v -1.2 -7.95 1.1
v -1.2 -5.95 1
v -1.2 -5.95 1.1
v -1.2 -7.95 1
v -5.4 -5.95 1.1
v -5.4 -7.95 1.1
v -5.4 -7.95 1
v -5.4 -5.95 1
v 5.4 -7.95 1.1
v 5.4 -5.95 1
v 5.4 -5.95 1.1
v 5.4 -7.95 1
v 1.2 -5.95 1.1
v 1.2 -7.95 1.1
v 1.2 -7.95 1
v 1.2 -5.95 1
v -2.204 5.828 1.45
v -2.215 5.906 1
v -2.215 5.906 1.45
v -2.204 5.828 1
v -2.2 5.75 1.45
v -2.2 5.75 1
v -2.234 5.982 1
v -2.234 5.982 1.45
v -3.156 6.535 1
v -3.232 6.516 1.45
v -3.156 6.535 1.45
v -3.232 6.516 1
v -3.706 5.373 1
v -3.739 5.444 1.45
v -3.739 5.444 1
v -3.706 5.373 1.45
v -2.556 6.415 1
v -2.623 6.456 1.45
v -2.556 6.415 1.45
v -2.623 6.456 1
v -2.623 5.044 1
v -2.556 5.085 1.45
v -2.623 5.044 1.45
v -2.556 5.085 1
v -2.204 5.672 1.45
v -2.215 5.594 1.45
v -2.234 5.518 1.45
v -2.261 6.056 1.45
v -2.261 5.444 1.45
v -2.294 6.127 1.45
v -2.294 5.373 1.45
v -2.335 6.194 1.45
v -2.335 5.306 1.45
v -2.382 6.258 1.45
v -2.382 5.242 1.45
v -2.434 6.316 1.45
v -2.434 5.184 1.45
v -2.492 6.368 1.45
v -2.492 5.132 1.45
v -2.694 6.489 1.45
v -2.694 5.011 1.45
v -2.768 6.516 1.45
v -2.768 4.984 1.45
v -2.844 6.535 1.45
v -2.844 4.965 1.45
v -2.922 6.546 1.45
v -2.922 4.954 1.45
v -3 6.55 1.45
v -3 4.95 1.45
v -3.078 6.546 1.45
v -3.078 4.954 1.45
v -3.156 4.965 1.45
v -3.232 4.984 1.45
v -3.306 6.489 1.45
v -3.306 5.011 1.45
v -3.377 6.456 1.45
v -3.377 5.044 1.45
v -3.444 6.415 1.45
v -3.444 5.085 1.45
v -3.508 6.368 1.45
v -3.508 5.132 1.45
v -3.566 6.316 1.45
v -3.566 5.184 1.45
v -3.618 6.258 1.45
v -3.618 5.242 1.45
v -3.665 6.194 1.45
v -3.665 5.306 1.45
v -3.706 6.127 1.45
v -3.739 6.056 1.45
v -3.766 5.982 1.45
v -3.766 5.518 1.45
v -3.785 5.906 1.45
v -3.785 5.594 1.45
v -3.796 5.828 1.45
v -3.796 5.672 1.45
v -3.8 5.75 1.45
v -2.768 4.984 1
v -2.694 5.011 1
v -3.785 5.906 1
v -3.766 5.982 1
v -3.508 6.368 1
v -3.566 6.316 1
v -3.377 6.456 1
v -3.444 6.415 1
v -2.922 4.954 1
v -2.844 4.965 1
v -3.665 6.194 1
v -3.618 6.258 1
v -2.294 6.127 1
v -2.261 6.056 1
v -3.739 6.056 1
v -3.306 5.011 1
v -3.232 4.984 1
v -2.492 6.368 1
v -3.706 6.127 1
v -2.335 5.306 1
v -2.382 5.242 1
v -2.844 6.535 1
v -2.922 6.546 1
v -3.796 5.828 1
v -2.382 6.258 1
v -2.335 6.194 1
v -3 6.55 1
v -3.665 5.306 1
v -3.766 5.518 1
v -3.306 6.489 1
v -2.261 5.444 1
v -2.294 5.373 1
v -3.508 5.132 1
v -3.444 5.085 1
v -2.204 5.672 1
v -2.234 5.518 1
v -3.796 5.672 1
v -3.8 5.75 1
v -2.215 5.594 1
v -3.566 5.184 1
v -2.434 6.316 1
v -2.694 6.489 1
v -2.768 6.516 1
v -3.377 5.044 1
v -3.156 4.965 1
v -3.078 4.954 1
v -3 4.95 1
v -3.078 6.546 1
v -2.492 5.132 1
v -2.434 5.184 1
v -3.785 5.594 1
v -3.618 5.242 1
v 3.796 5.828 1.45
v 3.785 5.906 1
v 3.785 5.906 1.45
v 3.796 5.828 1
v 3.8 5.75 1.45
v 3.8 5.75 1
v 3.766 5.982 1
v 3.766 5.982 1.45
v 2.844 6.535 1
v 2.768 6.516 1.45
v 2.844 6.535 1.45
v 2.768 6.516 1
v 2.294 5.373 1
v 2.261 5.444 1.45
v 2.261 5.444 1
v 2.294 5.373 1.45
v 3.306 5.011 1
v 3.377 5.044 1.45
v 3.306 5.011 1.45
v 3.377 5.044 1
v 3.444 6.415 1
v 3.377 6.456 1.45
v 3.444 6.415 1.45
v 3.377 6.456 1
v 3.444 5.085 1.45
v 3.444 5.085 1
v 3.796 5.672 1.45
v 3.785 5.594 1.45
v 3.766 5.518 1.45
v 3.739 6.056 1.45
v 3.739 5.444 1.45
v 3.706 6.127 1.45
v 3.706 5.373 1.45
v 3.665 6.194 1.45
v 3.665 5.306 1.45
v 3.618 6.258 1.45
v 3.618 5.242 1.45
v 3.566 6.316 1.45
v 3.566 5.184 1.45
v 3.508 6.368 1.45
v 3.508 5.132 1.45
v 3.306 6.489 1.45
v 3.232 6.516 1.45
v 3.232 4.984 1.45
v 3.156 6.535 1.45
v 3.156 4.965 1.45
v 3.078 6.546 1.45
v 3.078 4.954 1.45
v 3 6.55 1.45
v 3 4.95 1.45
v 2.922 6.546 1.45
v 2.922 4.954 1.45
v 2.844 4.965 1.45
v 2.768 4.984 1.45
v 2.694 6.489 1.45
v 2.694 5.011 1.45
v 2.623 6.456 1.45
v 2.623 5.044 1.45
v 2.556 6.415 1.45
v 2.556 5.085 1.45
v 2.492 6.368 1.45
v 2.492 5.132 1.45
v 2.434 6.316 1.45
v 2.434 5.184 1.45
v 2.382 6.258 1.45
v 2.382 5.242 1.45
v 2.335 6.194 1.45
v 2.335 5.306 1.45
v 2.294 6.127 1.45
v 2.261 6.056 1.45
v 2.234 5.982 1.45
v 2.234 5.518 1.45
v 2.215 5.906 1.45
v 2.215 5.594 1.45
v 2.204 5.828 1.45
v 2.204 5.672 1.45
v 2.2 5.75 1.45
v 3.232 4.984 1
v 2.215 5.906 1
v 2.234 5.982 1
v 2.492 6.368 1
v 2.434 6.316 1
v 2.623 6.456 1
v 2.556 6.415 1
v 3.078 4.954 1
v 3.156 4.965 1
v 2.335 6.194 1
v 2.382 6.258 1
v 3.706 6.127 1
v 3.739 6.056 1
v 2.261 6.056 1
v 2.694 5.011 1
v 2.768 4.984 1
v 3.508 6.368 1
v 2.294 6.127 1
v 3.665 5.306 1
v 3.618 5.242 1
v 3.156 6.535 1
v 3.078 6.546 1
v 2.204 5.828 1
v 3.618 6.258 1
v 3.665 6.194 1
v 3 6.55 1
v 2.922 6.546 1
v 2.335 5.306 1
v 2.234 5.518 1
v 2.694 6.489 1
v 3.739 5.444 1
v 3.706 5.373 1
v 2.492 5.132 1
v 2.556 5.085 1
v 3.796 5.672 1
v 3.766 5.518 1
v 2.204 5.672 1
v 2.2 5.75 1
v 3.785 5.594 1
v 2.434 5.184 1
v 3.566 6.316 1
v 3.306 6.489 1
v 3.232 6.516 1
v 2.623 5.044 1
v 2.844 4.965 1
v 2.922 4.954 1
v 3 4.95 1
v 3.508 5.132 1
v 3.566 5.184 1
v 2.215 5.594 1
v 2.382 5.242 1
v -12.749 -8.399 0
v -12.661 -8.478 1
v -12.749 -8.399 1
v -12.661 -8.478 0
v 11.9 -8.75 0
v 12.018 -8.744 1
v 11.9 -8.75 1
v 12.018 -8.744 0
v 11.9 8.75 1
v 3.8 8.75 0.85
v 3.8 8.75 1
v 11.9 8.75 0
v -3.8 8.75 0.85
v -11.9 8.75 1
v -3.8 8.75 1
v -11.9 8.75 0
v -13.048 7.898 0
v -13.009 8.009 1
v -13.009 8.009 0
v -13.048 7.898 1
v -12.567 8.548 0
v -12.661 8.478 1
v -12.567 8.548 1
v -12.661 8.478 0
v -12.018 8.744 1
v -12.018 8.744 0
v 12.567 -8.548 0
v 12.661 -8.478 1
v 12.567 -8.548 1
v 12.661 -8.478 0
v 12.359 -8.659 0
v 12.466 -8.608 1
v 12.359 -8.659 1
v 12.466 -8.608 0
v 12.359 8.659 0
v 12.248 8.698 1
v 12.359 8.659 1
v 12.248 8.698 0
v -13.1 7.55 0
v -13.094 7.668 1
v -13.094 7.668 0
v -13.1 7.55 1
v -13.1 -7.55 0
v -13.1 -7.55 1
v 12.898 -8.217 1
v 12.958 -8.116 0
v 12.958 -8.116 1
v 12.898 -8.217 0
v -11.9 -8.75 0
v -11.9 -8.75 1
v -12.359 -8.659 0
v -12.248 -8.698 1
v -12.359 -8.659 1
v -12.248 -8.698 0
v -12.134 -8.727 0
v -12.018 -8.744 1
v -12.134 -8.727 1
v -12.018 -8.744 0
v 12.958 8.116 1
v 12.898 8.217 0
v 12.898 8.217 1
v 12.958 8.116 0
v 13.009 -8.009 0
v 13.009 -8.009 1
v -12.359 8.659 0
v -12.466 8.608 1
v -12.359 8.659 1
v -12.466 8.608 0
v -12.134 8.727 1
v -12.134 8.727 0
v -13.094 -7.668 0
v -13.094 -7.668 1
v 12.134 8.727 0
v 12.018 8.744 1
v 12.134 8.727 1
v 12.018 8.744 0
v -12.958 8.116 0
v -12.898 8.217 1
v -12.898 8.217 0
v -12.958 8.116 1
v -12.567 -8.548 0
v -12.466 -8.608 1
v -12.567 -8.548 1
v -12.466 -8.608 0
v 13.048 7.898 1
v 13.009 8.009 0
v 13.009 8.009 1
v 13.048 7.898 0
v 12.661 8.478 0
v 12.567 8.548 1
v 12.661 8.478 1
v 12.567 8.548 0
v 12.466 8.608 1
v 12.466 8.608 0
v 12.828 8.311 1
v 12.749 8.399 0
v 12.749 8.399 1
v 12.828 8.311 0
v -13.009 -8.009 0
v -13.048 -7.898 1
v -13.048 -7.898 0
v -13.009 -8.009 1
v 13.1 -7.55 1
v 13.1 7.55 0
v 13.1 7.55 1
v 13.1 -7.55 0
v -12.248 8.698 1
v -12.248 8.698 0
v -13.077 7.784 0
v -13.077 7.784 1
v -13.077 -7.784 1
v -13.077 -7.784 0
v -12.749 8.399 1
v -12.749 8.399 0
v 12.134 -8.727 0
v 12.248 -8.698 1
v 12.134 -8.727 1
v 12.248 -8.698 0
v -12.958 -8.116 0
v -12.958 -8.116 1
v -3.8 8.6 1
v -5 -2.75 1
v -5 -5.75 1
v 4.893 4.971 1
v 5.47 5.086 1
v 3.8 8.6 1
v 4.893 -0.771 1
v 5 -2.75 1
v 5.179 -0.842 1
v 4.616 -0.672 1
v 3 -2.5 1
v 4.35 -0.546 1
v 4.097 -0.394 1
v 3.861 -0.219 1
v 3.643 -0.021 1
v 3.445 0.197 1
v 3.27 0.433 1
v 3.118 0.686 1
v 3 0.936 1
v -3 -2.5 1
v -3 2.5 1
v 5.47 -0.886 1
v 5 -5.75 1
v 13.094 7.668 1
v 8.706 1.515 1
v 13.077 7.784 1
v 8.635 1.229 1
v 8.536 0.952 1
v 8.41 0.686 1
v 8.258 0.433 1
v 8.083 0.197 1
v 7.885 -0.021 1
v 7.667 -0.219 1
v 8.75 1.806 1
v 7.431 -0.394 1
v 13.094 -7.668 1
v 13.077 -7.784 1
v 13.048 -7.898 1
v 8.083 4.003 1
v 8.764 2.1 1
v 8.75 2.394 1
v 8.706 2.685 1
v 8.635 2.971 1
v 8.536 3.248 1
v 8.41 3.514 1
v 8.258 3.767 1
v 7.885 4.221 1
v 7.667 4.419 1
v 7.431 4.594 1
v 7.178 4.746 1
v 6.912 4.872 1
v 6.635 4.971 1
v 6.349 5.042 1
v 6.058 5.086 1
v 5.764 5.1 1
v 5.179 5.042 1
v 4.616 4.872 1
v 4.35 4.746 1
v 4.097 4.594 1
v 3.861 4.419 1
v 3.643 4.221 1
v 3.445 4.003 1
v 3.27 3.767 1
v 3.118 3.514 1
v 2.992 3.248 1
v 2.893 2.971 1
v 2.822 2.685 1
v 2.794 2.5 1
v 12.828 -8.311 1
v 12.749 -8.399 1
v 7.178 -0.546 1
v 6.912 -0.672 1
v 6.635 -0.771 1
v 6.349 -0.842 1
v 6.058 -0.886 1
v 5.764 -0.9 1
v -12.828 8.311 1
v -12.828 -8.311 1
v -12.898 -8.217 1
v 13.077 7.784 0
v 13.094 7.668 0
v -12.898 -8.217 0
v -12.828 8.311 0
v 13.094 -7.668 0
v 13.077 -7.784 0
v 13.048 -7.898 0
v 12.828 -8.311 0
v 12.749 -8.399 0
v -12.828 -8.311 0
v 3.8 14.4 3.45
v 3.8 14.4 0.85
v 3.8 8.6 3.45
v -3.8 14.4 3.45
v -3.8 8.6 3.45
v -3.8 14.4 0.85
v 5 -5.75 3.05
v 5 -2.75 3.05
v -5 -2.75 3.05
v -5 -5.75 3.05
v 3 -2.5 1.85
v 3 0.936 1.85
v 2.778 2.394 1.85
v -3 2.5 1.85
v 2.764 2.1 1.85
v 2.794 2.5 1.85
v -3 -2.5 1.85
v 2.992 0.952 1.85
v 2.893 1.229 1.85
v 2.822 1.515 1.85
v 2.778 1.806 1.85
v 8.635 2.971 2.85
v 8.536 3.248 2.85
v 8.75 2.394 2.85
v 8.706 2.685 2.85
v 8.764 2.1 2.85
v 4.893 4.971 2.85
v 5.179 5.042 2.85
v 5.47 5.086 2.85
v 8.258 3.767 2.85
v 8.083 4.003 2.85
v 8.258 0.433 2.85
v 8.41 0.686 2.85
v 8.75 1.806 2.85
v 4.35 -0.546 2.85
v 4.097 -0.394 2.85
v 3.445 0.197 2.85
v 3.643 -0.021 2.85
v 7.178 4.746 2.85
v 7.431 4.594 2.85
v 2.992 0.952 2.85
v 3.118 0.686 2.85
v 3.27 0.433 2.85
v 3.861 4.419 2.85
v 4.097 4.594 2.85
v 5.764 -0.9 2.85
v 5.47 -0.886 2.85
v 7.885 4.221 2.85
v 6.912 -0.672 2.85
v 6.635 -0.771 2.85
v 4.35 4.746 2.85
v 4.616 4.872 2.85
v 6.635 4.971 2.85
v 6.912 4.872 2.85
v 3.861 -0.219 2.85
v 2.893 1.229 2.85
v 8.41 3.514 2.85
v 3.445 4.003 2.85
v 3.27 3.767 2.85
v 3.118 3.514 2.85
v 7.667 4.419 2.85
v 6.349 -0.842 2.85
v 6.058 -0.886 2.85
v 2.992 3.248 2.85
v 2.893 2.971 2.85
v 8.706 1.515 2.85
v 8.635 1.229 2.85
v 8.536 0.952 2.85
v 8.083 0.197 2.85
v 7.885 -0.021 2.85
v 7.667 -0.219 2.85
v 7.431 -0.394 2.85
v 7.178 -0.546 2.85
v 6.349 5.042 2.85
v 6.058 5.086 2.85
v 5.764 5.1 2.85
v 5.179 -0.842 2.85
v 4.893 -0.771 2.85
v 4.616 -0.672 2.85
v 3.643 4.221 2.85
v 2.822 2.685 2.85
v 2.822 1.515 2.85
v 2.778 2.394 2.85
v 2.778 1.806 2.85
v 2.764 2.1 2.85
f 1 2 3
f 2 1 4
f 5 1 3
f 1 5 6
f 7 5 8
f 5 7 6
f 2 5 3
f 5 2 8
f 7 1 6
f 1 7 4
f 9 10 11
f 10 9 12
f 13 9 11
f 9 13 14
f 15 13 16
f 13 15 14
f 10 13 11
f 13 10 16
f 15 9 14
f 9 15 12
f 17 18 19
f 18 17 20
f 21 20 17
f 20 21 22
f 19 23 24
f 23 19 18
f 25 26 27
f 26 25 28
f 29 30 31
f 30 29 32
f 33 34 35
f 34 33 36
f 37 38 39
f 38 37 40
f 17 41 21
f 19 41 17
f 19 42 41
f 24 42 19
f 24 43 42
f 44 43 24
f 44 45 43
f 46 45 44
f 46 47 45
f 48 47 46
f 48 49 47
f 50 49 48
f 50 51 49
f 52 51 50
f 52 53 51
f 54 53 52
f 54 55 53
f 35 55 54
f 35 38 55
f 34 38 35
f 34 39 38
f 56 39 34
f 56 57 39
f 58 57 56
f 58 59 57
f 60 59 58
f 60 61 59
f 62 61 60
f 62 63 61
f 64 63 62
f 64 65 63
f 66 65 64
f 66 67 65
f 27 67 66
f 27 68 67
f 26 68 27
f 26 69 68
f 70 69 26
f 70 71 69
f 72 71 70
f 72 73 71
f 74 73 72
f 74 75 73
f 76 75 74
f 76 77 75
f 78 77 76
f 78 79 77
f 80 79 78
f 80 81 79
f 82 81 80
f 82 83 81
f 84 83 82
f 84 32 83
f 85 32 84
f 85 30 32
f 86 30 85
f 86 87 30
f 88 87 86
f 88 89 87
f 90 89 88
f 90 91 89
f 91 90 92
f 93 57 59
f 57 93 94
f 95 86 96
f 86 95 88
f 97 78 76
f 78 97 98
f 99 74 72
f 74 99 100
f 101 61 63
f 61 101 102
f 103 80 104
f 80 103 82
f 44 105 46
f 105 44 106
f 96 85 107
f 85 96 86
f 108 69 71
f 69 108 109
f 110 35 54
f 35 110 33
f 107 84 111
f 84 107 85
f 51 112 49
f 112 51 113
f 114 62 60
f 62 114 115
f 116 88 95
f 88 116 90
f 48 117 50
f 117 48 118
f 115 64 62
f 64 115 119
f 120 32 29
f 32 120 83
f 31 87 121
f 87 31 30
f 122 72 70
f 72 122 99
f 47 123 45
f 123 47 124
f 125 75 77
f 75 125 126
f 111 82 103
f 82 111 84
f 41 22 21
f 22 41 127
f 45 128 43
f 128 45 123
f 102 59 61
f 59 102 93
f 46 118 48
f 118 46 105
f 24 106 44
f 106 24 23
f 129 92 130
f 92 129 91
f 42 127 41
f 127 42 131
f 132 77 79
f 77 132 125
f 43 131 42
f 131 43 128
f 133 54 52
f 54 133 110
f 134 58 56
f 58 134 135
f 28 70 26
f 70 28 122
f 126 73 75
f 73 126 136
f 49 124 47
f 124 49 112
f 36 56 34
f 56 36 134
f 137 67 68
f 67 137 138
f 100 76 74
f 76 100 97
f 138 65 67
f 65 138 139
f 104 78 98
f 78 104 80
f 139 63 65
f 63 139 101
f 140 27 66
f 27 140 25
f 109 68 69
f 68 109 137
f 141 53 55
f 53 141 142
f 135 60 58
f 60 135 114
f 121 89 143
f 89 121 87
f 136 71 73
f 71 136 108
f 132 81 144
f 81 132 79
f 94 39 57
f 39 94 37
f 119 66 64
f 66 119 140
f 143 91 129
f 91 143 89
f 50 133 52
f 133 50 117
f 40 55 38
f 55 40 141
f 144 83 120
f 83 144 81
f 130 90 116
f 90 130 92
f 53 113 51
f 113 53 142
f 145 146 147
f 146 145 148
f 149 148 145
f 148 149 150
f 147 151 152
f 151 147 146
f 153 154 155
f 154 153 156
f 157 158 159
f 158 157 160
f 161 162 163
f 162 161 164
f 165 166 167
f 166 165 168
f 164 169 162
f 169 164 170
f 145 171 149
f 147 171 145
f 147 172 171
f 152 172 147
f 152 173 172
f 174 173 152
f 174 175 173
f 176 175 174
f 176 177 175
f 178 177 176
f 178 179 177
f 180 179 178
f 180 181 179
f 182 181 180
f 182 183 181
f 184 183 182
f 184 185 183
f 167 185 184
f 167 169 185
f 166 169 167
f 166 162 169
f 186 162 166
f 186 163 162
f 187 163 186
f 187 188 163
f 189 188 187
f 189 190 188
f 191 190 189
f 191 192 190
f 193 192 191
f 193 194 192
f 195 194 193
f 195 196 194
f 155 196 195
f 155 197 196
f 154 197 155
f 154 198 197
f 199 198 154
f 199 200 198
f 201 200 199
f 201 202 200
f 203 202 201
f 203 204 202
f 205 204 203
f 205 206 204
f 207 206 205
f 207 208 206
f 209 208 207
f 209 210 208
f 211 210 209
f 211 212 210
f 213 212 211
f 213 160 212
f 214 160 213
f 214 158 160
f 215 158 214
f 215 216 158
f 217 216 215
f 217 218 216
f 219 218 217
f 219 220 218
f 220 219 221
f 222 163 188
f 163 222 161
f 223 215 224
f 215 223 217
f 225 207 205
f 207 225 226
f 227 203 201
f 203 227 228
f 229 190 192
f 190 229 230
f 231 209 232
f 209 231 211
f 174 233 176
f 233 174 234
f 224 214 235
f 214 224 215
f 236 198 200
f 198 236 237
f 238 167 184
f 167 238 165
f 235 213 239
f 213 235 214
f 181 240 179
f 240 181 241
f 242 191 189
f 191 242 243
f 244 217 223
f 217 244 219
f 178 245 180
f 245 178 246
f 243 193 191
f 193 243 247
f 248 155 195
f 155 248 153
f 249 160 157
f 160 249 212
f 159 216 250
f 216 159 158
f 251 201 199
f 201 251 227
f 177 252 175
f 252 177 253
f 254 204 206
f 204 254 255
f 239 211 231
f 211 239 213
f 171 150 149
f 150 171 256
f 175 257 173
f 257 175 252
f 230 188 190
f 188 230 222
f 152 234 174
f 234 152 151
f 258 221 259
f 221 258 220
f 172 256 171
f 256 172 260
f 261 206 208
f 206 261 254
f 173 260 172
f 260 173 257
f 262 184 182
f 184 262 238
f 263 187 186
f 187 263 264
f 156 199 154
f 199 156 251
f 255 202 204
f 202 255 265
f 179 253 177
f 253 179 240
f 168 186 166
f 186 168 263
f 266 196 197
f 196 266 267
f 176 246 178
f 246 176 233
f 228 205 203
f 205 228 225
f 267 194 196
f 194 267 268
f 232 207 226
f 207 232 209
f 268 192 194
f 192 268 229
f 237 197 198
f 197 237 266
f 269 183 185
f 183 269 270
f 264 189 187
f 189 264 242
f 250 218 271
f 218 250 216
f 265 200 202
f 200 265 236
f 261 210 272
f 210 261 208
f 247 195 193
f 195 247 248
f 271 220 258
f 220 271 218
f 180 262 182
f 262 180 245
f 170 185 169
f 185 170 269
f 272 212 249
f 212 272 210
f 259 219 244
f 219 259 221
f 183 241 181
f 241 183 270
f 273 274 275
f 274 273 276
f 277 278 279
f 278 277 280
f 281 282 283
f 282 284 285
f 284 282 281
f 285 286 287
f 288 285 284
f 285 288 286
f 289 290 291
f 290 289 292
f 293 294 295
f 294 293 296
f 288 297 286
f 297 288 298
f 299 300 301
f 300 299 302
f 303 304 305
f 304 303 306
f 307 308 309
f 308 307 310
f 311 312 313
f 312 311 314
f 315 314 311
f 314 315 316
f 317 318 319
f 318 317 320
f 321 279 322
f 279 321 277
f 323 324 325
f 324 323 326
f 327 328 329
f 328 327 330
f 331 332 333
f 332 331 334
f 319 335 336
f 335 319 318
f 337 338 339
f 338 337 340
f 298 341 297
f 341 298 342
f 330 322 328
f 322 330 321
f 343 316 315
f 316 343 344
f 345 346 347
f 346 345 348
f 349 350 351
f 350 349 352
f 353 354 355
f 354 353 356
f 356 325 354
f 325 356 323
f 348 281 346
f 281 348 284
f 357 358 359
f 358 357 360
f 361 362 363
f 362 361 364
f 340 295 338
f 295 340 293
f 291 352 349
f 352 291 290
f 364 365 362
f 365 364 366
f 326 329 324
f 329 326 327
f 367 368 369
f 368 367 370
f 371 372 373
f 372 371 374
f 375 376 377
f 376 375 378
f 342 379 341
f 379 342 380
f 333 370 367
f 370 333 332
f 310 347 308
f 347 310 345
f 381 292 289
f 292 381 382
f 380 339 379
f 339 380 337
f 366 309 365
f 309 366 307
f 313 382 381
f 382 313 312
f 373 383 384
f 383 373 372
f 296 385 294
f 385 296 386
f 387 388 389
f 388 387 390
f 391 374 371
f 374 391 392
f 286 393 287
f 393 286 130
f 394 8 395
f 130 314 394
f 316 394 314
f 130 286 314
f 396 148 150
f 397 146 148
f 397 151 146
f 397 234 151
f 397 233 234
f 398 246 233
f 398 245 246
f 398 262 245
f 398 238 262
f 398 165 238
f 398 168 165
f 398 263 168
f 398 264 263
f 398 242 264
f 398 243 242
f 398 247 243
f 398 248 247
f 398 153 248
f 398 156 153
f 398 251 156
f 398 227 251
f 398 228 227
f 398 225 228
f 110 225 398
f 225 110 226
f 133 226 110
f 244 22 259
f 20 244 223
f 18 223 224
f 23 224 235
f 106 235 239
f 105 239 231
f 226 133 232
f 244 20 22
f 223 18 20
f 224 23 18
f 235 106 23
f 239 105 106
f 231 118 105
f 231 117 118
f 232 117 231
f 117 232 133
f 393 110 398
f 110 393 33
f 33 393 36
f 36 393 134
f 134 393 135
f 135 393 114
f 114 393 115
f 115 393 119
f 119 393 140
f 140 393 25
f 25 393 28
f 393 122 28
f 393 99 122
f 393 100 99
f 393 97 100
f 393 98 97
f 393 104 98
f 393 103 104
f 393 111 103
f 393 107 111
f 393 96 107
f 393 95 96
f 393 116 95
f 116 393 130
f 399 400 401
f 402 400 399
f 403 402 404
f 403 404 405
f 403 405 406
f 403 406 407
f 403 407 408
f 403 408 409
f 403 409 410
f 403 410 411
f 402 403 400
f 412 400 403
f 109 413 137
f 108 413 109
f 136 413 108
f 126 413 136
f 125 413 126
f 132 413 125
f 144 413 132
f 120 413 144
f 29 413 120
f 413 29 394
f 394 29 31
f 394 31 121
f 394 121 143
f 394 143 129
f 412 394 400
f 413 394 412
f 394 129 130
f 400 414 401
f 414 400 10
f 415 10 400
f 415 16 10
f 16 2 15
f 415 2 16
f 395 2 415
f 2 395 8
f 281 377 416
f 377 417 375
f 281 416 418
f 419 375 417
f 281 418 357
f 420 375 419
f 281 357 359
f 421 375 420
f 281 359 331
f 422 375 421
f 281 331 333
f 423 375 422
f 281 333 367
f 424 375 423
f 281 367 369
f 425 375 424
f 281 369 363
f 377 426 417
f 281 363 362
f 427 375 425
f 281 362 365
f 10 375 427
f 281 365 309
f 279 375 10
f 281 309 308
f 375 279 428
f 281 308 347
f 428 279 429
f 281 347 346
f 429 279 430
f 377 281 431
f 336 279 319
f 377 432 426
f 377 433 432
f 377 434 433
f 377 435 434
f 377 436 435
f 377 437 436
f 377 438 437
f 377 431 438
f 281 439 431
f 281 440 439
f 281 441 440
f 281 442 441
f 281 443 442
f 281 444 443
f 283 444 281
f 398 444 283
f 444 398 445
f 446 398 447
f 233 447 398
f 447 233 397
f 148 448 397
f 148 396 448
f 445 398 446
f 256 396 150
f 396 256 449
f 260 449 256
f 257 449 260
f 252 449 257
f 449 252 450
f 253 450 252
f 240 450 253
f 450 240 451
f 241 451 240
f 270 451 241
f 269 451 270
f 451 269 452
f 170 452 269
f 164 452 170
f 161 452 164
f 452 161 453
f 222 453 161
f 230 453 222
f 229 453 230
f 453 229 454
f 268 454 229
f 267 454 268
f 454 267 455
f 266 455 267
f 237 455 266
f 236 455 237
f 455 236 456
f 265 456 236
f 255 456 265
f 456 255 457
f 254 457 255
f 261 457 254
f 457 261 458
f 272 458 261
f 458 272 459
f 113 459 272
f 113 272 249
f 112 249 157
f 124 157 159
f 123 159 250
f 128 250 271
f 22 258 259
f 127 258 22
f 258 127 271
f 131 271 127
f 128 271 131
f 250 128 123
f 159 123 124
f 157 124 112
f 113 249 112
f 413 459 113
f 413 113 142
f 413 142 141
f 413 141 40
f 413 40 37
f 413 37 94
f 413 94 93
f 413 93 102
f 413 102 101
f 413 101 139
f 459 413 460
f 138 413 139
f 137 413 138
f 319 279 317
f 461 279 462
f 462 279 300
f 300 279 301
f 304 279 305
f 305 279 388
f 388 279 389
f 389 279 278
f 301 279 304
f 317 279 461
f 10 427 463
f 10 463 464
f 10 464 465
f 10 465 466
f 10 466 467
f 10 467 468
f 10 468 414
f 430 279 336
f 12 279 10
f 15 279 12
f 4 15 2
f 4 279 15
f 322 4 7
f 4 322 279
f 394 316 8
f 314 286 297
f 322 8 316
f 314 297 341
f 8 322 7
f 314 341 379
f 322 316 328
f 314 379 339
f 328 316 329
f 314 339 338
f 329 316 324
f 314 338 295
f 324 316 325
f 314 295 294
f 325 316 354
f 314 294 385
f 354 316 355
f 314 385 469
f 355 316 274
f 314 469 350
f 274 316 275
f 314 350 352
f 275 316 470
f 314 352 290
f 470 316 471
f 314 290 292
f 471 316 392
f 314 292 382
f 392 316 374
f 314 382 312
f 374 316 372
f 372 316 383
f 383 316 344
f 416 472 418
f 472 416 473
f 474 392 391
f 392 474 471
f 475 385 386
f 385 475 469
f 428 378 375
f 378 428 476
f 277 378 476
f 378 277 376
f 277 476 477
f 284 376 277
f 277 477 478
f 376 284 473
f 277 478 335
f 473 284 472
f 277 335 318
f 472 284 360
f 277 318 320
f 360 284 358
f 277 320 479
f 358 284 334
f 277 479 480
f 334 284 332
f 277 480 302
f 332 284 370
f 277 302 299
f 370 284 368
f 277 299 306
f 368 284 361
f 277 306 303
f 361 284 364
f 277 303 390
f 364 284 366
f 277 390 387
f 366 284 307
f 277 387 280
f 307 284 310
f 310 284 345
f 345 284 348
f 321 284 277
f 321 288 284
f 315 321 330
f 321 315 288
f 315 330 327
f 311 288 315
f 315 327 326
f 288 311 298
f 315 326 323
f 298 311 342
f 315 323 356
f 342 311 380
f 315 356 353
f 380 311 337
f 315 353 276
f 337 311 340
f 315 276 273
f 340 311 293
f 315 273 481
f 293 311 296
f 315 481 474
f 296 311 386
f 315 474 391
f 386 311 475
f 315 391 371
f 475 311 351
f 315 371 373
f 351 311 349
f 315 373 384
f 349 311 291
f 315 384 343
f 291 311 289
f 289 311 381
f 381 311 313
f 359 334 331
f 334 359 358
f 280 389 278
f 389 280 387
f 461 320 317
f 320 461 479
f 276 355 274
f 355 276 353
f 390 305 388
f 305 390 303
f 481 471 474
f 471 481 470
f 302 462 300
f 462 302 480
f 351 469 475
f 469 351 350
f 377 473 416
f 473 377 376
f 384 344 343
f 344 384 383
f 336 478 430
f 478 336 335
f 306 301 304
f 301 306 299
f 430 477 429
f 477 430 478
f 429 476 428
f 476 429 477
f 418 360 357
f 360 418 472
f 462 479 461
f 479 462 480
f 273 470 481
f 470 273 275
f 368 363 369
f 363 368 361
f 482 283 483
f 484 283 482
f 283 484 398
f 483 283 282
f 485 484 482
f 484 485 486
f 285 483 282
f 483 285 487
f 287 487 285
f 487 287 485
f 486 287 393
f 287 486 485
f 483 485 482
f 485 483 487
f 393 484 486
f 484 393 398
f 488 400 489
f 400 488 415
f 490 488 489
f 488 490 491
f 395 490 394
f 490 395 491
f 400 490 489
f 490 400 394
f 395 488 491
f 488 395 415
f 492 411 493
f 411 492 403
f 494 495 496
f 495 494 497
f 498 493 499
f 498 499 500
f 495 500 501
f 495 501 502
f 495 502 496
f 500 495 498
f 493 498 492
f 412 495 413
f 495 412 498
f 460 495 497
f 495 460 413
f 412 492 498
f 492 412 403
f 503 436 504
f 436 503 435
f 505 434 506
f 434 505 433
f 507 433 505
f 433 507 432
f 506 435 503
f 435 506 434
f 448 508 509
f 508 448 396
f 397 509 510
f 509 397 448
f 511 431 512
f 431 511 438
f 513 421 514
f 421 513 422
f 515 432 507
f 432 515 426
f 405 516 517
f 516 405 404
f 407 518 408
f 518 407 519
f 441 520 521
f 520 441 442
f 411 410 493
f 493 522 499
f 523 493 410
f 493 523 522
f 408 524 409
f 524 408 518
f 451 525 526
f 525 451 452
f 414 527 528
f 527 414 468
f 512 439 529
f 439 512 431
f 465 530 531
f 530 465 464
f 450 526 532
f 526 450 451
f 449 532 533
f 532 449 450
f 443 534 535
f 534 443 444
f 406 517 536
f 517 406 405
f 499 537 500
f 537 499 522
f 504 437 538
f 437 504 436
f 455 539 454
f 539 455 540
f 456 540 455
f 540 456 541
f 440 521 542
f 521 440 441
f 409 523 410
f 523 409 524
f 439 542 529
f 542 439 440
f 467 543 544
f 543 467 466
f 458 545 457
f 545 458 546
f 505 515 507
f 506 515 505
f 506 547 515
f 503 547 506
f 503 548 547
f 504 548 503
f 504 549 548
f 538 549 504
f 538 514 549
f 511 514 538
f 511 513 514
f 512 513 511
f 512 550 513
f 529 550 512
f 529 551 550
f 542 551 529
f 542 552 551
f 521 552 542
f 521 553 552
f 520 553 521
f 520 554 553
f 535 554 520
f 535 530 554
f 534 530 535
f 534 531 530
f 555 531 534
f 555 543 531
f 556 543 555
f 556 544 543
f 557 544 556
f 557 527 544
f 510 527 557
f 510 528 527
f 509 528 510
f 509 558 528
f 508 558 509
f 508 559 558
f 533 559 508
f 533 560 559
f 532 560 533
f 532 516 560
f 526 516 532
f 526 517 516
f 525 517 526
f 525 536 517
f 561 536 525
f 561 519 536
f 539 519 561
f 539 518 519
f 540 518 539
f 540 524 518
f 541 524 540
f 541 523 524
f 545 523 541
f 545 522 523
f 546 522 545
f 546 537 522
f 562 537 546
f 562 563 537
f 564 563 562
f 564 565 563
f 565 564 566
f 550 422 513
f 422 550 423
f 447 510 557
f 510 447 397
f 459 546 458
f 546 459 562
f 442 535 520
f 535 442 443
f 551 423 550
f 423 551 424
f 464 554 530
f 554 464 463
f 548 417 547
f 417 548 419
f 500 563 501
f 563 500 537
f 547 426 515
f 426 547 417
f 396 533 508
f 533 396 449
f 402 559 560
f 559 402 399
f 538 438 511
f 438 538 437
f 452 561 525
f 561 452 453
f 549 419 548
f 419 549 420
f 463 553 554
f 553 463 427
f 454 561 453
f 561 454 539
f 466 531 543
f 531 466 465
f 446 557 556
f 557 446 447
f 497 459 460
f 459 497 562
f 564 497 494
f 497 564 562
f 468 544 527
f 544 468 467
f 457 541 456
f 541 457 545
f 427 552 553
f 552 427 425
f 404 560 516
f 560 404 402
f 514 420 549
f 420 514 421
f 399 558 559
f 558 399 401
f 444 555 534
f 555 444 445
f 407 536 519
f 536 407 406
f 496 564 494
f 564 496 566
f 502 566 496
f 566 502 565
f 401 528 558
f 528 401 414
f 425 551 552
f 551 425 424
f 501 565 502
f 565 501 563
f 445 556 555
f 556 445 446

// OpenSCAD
$fn = 64;

// Battery charger module (PCB + major features) as ONE connected solid
module battery_charger_module(L=26.2, W=17.5, T=1.0) {

    // PCB corner radius
    corner_r = 1.2;

    // Micro-USB connector (on +Y short edge)
    usb_w = 7.6;
    usb_d = 5.8;
    usb_h = 2.6;

    // Battery pads (on -Y short edge, top)
    pad_len = 4.2;
    pad_w   = 2.0;
    pad_h   = 0.25;

    // Pin header / solder block (near -Y edge, top)
    header_w = 10.0;
    header_d = 3.0;
    header_h = 2.2;

    // Main IC (top)
    chip_l = 6.0;
    chip_w = 5.0;
    chip_h = 1.0;

    // Inductor / large component (top)
    inductor_d = 6.0;
    inductor_h = 2.0;

    // LEDs (top, near +Y edge)
    led_d = 1.6;
    led_h = 0.6;

    // Small overlap to guarantee watertight union connections
    ov = 0.15;

    // Rounded PCB base (exact L x W footprint, thickness T)
    module rounded_pcb(l, w, t, r) {
        linear_extrude(height=t, center=false)
            offset(r=r)
                square([l - 2*r, w - 2*r], center=true);
    }

    // Clamp helper to keep features within board outline where needed
    function clamp(v, lo, hi) = v < lo ? lo : (v > hi ? hi : v);

    union() {
        // PCB: bottom at z=0, top at z=T
        translate([0, 0, 0])
            rounded_pcb(L, W, T, corner_r);

        // Micro-USB connector: sits on top of PCB and protrudes beyond +Y edge
        // Ensure it overlaps into PCB by ov in both Y and Z.
        translate([0,
                   W/2 + usb_d/2 - ov,
                   T + usb_h/2 - ov])
            cube([usb_w, usb_d, usb_h], center=true);

        // Battery pads (B+ / B-) on top near -Y edge, kept within board
        pad_y = -W/2 + pad_w/2 + 0.8;
        pad_x_off = clamp(pad_len/2 + 1.2, 0, L/2 - pad_len/2 - 0.6);
        for (sx = [-1, 1]) {
            translate([sx*pad_x_off,
                       pad_y,
                       T + pad_h/2 - ov])
                cube([pad_len, pad_w, pad_h], center=true);
        }

        // Header/solder block near -Y edge on top, kept within board
        header_y = -W/2 + header_d/2 + 3.0;
        translate([0,
                   header_y,
                   T + header_h/2 - ov])
            cube([header_w, header_d, header_h], center=true);

        // Main charger IC on top center
        translate([0, 0, T + chip_h/2 - ov])
            cube([chip_l, chip_w, chip_h], center=true);

        // Inductor on top, offset but within board
        ind_x = clamp(L*0.22, -L/2 + inductor_d/2 + 0.6, L/2 - inductor_d/2 - 0.6);
        ind_y = clamp(W*0.12, -W/2 + inductor_d/2 + 0.6, W/2 - inductor_d/2 - 0.6);
        translate([ind_x, ind_y, T + inductor_h/2 - ov])
            cylinder(d=inductor_d, h=inductor_h, center=true);

        // Two LEDs near +Y edge on top, kept within board
        led_y = W/2 - 3.0;
        led_x_off = clamp(3.0, 0, L/2 - led_d/2 - 0.6);
        for (sx = [-1, 1]) {
            translate([sx*led_x_off,
                       led_y,
                       T + led_h/2 - ov])
                cylinder(d=led_d, h=led_h, center=true);
        }
    }
}

battery_charger_module();
